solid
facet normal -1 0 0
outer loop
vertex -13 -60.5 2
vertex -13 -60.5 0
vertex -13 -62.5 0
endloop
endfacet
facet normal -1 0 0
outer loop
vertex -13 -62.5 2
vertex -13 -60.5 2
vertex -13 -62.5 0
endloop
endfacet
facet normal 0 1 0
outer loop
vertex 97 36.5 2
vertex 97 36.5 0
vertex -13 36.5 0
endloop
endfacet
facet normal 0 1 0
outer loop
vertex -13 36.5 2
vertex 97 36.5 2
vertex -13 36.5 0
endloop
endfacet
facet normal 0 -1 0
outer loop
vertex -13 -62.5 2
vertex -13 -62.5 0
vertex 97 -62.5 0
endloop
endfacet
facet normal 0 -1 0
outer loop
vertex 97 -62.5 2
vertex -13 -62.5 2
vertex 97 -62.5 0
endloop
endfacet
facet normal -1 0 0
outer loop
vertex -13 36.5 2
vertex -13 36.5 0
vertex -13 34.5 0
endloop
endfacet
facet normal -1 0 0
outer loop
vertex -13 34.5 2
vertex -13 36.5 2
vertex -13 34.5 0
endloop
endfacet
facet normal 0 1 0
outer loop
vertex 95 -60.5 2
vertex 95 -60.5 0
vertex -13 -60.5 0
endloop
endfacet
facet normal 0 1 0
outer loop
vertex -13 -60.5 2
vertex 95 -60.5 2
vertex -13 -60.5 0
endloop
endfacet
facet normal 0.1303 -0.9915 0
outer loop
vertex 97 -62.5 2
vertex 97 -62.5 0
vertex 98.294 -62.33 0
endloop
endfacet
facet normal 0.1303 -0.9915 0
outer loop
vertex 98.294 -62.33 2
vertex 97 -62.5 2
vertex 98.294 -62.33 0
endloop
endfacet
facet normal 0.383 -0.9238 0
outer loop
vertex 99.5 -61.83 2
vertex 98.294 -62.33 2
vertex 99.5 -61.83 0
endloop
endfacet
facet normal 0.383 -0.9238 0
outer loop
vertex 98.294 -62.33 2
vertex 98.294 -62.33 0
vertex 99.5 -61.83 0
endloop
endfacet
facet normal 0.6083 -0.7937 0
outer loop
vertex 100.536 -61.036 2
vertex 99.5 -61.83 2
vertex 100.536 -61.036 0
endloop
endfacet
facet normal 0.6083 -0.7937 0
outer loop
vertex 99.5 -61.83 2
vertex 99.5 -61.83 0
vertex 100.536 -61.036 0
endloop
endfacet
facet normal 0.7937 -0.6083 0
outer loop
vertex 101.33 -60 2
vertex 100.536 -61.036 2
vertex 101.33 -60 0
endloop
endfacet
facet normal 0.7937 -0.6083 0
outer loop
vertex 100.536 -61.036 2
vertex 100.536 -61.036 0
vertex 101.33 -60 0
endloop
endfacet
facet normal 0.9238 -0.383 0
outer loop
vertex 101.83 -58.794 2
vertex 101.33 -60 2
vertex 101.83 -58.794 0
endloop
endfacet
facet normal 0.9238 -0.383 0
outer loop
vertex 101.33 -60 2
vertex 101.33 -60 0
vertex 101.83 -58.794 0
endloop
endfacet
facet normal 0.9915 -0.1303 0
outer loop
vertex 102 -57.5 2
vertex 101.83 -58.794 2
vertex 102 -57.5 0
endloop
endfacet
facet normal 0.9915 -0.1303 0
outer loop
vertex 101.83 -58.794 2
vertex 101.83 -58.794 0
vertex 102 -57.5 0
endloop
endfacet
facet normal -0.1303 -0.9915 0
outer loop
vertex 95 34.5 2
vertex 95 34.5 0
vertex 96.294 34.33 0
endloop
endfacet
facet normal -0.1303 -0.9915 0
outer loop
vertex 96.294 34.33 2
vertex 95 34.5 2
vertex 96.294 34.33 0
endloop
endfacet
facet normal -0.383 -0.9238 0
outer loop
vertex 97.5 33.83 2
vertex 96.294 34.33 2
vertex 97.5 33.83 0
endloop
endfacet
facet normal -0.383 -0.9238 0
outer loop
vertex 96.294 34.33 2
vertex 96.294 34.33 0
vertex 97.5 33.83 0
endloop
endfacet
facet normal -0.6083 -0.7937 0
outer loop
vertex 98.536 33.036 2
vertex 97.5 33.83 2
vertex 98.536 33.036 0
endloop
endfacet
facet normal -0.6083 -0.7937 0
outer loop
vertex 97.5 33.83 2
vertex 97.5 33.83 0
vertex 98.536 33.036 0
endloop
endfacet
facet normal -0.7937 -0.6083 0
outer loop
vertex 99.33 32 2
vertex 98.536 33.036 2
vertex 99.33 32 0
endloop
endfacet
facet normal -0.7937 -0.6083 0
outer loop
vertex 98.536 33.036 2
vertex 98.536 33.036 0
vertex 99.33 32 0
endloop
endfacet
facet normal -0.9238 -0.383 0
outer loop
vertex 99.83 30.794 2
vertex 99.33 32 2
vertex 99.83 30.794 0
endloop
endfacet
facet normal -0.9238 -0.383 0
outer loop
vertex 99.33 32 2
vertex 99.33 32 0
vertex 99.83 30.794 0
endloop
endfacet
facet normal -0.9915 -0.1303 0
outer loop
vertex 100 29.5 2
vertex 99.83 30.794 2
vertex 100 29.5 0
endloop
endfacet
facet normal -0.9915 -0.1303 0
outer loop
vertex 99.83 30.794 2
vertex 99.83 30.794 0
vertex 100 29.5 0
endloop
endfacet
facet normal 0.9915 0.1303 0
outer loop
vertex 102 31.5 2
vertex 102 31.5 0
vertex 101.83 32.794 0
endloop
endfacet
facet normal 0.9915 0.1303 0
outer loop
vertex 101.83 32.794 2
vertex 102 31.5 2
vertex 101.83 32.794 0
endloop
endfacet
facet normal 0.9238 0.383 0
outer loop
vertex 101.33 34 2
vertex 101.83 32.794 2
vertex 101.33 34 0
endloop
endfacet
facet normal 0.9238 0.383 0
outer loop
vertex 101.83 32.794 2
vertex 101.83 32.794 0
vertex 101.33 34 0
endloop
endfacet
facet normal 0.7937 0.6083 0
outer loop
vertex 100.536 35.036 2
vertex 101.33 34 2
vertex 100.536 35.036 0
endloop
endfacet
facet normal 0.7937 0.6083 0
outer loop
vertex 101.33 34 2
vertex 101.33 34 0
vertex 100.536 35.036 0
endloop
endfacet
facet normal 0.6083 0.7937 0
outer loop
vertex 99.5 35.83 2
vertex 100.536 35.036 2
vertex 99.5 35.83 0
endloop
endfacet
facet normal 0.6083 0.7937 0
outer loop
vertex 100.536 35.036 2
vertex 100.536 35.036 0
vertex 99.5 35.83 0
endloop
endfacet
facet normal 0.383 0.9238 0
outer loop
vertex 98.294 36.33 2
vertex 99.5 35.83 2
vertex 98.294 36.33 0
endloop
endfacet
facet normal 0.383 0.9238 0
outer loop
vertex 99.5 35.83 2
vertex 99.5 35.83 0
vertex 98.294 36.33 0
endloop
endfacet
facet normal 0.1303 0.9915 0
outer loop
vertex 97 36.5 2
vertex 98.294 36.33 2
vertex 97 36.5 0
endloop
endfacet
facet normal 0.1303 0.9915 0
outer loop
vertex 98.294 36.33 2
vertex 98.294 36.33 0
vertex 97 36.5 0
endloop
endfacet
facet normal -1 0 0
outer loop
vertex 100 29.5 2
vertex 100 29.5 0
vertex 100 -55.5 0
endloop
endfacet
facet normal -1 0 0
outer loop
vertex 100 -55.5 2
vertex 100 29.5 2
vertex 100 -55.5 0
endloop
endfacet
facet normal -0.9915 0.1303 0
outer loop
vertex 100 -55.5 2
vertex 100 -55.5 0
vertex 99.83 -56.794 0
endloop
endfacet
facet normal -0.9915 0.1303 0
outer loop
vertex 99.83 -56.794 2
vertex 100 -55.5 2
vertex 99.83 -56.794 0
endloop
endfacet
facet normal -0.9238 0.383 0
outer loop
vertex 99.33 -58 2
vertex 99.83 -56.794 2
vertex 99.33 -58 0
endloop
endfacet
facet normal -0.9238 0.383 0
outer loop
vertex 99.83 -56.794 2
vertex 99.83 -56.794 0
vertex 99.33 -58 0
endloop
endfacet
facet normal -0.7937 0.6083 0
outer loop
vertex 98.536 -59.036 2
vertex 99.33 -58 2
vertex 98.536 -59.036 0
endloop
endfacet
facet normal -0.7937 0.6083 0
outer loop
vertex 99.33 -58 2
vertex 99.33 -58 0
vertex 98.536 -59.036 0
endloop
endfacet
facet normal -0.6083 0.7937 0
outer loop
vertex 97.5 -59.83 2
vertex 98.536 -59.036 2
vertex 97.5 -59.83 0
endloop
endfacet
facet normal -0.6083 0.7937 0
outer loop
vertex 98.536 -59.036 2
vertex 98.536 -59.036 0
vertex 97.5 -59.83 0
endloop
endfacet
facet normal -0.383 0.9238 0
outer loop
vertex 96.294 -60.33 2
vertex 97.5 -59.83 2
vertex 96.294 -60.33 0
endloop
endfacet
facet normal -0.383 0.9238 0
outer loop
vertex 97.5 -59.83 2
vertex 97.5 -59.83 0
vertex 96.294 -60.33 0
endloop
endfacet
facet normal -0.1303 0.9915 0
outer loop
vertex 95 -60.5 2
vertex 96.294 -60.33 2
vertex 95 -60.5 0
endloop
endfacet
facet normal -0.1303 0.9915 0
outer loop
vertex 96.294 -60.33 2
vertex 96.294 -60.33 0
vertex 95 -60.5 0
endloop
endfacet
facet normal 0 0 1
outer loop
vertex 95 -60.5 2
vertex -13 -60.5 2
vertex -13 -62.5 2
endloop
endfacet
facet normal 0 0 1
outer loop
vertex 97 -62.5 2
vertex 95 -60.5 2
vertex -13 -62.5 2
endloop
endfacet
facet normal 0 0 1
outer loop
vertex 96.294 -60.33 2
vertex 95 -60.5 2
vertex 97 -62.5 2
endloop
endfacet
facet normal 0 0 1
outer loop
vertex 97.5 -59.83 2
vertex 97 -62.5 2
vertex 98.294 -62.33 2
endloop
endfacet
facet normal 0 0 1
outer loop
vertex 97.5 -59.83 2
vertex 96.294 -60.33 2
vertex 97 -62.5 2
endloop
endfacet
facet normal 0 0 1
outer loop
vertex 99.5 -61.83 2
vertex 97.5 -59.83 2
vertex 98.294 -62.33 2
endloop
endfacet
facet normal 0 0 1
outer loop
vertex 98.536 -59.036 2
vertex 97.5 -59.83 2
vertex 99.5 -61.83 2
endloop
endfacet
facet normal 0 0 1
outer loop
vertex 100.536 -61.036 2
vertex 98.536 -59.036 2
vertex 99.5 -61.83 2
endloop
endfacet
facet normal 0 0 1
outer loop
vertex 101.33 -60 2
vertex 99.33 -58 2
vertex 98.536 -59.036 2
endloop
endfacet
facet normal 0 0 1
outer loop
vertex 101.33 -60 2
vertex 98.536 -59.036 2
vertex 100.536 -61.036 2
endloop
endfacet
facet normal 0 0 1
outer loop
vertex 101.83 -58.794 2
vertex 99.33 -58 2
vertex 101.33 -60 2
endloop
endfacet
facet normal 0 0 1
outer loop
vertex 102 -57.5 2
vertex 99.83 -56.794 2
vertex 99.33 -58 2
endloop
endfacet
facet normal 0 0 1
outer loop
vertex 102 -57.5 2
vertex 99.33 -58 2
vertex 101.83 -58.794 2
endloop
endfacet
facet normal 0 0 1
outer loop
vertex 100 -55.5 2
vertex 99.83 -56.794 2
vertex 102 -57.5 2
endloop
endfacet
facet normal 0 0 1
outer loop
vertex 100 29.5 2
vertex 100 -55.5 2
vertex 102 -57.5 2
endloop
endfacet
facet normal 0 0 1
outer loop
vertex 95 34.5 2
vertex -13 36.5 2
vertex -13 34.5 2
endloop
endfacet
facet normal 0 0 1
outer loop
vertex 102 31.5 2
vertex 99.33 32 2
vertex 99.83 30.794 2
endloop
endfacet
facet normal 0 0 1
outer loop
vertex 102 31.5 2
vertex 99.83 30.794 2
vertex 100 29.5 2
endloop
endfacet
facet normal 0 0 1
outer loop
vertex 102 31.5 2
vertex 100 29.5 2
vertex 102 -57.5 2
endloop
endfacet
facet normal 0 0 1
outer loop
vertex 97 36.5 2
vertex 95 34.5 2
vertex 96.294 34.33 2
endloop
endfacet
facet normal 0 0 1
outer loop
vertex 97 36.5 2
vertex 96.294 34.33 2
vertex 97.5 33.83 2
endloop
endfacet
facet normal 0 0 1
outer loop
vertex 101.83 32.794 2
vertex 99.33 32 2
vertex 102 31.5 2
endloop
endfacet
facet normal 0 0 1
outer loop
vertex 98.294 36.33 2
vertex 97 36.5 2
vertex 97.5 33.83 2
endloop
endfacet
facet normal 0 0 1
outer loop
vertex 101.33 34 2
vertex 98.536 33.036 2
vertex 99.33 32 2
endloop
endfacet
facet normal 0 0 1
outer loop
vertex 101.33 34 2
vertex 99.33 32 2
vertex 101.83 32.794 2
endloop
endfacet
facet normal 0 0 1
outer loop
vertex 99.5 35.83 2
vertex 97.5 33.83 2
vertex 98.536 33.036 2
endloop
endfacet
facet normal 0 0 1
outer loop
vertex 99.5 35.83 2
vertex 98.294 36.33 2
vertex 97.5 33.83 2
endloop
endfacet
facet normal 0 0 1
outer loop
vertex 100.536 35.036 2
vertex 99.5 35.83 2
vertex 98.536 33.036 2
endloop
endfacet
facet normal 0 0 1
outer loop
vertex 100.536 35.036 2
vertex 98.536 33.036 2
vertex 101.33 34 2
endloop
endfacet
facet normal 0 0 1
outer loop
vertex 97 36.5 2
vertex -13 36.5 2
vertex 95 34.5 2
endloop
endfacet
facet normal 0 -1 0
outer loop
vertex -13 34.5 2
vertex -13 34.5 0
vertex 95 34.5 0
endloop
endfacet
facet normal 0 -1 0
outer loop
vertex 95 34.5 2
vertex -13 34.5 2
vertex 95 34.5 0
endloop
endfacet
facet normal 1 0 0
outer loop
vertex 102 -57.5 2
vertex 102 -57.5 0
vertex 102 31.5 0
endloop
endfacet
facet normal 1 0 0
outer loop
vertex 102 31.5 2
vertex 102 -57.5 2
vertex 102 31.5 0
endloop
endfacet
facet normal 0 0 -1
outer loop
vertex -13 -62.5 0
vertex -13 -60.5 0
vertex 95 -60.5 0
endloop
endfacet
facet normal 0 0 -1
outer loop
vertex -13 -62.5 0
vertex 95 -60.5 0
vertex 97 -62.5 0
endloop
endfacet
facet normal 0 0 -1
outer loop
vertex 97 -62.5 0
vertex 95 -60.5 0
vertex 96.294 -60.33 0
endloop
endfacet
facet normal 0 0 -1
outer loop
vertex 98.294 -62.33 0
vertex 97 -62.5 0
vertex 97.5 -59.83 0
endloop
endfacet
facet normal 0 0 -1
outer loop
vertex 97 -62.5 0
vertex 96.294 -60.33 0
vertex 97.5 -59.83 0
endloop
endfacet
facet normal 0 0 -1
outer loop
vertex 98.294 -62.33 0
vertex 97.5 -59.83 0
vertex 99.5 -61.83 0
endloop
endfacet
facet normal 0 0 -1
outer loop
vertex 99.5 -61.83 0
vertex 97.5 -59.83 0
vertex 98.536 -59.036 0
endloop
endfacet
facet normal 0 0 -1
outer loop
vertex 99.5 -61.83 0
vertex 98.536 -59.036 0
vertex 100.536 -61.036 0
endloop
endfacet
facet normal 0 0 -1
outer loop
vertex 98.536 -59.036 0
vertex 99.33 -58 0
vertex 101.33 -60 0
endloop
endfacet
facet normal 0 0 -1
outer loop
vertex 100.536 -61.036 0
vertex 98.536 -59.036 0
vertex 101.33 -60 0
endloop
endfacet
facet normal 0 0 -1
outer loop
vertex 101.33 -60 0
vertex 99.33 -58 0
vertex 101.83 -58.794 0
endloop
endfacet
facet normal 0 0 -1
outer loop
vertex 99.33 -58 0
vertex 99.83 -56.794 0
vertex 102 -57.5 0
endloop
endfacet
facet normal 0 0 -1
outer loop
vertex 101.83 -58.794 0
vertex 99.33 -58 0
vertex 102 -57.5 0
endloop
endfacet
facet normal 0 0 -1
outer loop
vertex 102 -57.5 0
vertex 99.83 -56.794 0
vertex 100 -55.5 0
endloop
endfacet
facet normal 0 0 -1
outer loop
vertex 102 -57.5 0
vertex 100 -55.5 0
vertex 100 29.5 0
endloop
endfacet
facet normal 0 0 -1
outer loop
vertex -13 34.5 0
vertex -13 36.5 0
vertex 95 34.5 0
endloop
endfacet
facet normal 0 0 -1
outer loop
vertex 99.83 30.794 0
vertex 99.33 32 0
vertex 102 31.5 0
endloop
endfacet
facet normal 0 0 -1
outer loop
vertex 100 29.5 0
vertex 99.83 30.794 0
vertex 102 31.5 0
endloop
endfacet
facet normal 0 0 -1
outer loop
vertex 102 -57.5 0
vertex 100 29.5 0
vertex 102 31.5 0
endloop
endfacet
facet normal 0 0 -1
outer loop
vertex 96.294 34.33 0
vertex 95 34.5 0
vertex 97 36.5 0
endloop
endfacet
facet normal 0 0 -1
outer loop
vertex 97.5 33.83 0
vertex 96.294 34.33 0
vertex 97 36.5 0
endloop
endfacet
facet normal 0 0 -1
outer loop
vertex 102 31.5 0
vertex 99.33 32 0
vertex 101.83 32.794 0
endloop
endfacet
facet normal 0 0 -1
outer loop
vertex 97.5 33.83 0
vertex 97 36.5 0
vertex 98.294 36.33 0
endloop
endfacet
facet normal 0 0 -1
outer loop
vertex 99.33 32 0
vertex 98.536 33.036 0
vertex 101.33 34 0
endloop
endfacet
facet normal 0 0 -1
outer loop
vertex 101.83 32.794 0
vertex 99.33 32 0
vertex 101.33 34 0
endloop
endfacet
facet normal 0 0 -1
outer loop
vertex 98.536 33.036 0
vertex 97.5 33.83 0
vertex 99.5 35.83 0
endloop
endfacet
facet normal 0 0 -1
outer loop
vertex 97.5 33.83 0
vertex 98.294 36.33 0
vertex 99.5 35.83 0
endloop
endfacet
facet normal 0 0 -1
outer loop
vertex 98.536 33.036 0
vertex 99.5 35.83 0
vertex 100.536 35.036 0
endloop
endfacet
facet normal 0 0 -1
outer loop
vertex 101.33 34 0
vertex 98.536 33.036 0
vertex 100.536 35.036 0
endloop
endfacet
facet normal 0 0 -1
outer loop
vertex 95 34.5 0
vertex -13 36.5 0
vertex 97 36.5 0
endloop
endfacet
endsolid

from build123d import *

# Parameters (mm, degrees)
F1_DEPTH = 2


with BuildPart() as f1:
    # F0 (on Top) → F1 (new body)
    with BuildSketch(Plane.XY):
        with BuildLine():
            ThreePointArc((100, -55.5), (98.535534, -59.035534), (95, -60.5))
            Line((95, -60.5), (-13, -60.5))
            Line((-13, -60.5), (-13, -62.5))
            Line((-13, -62.5), (97, -62.5))
            ThreePointArc((97, -62.5), (100.535534, -61.035534), (102, -57.5))
            Line((102, -57.5), (102, 31.5))
            ThreePointArc((102, 31.5), (100.535534, 35.035534), (97, 36.5))
            Line((97, 36.5), (-13, 36.5))
            Line((-13, 36.5), (-13, 34.5))
            Line((-13, 34.5), (95, 34.5))
            ThreePointArc((95, 34.5), (98.535534, 33.035534), (100, 29.5))
            Line((100, 29.5), (100, -55.5))
        make_face()
    extrude(amount=F1_DEPTH)


solid = f1.part
